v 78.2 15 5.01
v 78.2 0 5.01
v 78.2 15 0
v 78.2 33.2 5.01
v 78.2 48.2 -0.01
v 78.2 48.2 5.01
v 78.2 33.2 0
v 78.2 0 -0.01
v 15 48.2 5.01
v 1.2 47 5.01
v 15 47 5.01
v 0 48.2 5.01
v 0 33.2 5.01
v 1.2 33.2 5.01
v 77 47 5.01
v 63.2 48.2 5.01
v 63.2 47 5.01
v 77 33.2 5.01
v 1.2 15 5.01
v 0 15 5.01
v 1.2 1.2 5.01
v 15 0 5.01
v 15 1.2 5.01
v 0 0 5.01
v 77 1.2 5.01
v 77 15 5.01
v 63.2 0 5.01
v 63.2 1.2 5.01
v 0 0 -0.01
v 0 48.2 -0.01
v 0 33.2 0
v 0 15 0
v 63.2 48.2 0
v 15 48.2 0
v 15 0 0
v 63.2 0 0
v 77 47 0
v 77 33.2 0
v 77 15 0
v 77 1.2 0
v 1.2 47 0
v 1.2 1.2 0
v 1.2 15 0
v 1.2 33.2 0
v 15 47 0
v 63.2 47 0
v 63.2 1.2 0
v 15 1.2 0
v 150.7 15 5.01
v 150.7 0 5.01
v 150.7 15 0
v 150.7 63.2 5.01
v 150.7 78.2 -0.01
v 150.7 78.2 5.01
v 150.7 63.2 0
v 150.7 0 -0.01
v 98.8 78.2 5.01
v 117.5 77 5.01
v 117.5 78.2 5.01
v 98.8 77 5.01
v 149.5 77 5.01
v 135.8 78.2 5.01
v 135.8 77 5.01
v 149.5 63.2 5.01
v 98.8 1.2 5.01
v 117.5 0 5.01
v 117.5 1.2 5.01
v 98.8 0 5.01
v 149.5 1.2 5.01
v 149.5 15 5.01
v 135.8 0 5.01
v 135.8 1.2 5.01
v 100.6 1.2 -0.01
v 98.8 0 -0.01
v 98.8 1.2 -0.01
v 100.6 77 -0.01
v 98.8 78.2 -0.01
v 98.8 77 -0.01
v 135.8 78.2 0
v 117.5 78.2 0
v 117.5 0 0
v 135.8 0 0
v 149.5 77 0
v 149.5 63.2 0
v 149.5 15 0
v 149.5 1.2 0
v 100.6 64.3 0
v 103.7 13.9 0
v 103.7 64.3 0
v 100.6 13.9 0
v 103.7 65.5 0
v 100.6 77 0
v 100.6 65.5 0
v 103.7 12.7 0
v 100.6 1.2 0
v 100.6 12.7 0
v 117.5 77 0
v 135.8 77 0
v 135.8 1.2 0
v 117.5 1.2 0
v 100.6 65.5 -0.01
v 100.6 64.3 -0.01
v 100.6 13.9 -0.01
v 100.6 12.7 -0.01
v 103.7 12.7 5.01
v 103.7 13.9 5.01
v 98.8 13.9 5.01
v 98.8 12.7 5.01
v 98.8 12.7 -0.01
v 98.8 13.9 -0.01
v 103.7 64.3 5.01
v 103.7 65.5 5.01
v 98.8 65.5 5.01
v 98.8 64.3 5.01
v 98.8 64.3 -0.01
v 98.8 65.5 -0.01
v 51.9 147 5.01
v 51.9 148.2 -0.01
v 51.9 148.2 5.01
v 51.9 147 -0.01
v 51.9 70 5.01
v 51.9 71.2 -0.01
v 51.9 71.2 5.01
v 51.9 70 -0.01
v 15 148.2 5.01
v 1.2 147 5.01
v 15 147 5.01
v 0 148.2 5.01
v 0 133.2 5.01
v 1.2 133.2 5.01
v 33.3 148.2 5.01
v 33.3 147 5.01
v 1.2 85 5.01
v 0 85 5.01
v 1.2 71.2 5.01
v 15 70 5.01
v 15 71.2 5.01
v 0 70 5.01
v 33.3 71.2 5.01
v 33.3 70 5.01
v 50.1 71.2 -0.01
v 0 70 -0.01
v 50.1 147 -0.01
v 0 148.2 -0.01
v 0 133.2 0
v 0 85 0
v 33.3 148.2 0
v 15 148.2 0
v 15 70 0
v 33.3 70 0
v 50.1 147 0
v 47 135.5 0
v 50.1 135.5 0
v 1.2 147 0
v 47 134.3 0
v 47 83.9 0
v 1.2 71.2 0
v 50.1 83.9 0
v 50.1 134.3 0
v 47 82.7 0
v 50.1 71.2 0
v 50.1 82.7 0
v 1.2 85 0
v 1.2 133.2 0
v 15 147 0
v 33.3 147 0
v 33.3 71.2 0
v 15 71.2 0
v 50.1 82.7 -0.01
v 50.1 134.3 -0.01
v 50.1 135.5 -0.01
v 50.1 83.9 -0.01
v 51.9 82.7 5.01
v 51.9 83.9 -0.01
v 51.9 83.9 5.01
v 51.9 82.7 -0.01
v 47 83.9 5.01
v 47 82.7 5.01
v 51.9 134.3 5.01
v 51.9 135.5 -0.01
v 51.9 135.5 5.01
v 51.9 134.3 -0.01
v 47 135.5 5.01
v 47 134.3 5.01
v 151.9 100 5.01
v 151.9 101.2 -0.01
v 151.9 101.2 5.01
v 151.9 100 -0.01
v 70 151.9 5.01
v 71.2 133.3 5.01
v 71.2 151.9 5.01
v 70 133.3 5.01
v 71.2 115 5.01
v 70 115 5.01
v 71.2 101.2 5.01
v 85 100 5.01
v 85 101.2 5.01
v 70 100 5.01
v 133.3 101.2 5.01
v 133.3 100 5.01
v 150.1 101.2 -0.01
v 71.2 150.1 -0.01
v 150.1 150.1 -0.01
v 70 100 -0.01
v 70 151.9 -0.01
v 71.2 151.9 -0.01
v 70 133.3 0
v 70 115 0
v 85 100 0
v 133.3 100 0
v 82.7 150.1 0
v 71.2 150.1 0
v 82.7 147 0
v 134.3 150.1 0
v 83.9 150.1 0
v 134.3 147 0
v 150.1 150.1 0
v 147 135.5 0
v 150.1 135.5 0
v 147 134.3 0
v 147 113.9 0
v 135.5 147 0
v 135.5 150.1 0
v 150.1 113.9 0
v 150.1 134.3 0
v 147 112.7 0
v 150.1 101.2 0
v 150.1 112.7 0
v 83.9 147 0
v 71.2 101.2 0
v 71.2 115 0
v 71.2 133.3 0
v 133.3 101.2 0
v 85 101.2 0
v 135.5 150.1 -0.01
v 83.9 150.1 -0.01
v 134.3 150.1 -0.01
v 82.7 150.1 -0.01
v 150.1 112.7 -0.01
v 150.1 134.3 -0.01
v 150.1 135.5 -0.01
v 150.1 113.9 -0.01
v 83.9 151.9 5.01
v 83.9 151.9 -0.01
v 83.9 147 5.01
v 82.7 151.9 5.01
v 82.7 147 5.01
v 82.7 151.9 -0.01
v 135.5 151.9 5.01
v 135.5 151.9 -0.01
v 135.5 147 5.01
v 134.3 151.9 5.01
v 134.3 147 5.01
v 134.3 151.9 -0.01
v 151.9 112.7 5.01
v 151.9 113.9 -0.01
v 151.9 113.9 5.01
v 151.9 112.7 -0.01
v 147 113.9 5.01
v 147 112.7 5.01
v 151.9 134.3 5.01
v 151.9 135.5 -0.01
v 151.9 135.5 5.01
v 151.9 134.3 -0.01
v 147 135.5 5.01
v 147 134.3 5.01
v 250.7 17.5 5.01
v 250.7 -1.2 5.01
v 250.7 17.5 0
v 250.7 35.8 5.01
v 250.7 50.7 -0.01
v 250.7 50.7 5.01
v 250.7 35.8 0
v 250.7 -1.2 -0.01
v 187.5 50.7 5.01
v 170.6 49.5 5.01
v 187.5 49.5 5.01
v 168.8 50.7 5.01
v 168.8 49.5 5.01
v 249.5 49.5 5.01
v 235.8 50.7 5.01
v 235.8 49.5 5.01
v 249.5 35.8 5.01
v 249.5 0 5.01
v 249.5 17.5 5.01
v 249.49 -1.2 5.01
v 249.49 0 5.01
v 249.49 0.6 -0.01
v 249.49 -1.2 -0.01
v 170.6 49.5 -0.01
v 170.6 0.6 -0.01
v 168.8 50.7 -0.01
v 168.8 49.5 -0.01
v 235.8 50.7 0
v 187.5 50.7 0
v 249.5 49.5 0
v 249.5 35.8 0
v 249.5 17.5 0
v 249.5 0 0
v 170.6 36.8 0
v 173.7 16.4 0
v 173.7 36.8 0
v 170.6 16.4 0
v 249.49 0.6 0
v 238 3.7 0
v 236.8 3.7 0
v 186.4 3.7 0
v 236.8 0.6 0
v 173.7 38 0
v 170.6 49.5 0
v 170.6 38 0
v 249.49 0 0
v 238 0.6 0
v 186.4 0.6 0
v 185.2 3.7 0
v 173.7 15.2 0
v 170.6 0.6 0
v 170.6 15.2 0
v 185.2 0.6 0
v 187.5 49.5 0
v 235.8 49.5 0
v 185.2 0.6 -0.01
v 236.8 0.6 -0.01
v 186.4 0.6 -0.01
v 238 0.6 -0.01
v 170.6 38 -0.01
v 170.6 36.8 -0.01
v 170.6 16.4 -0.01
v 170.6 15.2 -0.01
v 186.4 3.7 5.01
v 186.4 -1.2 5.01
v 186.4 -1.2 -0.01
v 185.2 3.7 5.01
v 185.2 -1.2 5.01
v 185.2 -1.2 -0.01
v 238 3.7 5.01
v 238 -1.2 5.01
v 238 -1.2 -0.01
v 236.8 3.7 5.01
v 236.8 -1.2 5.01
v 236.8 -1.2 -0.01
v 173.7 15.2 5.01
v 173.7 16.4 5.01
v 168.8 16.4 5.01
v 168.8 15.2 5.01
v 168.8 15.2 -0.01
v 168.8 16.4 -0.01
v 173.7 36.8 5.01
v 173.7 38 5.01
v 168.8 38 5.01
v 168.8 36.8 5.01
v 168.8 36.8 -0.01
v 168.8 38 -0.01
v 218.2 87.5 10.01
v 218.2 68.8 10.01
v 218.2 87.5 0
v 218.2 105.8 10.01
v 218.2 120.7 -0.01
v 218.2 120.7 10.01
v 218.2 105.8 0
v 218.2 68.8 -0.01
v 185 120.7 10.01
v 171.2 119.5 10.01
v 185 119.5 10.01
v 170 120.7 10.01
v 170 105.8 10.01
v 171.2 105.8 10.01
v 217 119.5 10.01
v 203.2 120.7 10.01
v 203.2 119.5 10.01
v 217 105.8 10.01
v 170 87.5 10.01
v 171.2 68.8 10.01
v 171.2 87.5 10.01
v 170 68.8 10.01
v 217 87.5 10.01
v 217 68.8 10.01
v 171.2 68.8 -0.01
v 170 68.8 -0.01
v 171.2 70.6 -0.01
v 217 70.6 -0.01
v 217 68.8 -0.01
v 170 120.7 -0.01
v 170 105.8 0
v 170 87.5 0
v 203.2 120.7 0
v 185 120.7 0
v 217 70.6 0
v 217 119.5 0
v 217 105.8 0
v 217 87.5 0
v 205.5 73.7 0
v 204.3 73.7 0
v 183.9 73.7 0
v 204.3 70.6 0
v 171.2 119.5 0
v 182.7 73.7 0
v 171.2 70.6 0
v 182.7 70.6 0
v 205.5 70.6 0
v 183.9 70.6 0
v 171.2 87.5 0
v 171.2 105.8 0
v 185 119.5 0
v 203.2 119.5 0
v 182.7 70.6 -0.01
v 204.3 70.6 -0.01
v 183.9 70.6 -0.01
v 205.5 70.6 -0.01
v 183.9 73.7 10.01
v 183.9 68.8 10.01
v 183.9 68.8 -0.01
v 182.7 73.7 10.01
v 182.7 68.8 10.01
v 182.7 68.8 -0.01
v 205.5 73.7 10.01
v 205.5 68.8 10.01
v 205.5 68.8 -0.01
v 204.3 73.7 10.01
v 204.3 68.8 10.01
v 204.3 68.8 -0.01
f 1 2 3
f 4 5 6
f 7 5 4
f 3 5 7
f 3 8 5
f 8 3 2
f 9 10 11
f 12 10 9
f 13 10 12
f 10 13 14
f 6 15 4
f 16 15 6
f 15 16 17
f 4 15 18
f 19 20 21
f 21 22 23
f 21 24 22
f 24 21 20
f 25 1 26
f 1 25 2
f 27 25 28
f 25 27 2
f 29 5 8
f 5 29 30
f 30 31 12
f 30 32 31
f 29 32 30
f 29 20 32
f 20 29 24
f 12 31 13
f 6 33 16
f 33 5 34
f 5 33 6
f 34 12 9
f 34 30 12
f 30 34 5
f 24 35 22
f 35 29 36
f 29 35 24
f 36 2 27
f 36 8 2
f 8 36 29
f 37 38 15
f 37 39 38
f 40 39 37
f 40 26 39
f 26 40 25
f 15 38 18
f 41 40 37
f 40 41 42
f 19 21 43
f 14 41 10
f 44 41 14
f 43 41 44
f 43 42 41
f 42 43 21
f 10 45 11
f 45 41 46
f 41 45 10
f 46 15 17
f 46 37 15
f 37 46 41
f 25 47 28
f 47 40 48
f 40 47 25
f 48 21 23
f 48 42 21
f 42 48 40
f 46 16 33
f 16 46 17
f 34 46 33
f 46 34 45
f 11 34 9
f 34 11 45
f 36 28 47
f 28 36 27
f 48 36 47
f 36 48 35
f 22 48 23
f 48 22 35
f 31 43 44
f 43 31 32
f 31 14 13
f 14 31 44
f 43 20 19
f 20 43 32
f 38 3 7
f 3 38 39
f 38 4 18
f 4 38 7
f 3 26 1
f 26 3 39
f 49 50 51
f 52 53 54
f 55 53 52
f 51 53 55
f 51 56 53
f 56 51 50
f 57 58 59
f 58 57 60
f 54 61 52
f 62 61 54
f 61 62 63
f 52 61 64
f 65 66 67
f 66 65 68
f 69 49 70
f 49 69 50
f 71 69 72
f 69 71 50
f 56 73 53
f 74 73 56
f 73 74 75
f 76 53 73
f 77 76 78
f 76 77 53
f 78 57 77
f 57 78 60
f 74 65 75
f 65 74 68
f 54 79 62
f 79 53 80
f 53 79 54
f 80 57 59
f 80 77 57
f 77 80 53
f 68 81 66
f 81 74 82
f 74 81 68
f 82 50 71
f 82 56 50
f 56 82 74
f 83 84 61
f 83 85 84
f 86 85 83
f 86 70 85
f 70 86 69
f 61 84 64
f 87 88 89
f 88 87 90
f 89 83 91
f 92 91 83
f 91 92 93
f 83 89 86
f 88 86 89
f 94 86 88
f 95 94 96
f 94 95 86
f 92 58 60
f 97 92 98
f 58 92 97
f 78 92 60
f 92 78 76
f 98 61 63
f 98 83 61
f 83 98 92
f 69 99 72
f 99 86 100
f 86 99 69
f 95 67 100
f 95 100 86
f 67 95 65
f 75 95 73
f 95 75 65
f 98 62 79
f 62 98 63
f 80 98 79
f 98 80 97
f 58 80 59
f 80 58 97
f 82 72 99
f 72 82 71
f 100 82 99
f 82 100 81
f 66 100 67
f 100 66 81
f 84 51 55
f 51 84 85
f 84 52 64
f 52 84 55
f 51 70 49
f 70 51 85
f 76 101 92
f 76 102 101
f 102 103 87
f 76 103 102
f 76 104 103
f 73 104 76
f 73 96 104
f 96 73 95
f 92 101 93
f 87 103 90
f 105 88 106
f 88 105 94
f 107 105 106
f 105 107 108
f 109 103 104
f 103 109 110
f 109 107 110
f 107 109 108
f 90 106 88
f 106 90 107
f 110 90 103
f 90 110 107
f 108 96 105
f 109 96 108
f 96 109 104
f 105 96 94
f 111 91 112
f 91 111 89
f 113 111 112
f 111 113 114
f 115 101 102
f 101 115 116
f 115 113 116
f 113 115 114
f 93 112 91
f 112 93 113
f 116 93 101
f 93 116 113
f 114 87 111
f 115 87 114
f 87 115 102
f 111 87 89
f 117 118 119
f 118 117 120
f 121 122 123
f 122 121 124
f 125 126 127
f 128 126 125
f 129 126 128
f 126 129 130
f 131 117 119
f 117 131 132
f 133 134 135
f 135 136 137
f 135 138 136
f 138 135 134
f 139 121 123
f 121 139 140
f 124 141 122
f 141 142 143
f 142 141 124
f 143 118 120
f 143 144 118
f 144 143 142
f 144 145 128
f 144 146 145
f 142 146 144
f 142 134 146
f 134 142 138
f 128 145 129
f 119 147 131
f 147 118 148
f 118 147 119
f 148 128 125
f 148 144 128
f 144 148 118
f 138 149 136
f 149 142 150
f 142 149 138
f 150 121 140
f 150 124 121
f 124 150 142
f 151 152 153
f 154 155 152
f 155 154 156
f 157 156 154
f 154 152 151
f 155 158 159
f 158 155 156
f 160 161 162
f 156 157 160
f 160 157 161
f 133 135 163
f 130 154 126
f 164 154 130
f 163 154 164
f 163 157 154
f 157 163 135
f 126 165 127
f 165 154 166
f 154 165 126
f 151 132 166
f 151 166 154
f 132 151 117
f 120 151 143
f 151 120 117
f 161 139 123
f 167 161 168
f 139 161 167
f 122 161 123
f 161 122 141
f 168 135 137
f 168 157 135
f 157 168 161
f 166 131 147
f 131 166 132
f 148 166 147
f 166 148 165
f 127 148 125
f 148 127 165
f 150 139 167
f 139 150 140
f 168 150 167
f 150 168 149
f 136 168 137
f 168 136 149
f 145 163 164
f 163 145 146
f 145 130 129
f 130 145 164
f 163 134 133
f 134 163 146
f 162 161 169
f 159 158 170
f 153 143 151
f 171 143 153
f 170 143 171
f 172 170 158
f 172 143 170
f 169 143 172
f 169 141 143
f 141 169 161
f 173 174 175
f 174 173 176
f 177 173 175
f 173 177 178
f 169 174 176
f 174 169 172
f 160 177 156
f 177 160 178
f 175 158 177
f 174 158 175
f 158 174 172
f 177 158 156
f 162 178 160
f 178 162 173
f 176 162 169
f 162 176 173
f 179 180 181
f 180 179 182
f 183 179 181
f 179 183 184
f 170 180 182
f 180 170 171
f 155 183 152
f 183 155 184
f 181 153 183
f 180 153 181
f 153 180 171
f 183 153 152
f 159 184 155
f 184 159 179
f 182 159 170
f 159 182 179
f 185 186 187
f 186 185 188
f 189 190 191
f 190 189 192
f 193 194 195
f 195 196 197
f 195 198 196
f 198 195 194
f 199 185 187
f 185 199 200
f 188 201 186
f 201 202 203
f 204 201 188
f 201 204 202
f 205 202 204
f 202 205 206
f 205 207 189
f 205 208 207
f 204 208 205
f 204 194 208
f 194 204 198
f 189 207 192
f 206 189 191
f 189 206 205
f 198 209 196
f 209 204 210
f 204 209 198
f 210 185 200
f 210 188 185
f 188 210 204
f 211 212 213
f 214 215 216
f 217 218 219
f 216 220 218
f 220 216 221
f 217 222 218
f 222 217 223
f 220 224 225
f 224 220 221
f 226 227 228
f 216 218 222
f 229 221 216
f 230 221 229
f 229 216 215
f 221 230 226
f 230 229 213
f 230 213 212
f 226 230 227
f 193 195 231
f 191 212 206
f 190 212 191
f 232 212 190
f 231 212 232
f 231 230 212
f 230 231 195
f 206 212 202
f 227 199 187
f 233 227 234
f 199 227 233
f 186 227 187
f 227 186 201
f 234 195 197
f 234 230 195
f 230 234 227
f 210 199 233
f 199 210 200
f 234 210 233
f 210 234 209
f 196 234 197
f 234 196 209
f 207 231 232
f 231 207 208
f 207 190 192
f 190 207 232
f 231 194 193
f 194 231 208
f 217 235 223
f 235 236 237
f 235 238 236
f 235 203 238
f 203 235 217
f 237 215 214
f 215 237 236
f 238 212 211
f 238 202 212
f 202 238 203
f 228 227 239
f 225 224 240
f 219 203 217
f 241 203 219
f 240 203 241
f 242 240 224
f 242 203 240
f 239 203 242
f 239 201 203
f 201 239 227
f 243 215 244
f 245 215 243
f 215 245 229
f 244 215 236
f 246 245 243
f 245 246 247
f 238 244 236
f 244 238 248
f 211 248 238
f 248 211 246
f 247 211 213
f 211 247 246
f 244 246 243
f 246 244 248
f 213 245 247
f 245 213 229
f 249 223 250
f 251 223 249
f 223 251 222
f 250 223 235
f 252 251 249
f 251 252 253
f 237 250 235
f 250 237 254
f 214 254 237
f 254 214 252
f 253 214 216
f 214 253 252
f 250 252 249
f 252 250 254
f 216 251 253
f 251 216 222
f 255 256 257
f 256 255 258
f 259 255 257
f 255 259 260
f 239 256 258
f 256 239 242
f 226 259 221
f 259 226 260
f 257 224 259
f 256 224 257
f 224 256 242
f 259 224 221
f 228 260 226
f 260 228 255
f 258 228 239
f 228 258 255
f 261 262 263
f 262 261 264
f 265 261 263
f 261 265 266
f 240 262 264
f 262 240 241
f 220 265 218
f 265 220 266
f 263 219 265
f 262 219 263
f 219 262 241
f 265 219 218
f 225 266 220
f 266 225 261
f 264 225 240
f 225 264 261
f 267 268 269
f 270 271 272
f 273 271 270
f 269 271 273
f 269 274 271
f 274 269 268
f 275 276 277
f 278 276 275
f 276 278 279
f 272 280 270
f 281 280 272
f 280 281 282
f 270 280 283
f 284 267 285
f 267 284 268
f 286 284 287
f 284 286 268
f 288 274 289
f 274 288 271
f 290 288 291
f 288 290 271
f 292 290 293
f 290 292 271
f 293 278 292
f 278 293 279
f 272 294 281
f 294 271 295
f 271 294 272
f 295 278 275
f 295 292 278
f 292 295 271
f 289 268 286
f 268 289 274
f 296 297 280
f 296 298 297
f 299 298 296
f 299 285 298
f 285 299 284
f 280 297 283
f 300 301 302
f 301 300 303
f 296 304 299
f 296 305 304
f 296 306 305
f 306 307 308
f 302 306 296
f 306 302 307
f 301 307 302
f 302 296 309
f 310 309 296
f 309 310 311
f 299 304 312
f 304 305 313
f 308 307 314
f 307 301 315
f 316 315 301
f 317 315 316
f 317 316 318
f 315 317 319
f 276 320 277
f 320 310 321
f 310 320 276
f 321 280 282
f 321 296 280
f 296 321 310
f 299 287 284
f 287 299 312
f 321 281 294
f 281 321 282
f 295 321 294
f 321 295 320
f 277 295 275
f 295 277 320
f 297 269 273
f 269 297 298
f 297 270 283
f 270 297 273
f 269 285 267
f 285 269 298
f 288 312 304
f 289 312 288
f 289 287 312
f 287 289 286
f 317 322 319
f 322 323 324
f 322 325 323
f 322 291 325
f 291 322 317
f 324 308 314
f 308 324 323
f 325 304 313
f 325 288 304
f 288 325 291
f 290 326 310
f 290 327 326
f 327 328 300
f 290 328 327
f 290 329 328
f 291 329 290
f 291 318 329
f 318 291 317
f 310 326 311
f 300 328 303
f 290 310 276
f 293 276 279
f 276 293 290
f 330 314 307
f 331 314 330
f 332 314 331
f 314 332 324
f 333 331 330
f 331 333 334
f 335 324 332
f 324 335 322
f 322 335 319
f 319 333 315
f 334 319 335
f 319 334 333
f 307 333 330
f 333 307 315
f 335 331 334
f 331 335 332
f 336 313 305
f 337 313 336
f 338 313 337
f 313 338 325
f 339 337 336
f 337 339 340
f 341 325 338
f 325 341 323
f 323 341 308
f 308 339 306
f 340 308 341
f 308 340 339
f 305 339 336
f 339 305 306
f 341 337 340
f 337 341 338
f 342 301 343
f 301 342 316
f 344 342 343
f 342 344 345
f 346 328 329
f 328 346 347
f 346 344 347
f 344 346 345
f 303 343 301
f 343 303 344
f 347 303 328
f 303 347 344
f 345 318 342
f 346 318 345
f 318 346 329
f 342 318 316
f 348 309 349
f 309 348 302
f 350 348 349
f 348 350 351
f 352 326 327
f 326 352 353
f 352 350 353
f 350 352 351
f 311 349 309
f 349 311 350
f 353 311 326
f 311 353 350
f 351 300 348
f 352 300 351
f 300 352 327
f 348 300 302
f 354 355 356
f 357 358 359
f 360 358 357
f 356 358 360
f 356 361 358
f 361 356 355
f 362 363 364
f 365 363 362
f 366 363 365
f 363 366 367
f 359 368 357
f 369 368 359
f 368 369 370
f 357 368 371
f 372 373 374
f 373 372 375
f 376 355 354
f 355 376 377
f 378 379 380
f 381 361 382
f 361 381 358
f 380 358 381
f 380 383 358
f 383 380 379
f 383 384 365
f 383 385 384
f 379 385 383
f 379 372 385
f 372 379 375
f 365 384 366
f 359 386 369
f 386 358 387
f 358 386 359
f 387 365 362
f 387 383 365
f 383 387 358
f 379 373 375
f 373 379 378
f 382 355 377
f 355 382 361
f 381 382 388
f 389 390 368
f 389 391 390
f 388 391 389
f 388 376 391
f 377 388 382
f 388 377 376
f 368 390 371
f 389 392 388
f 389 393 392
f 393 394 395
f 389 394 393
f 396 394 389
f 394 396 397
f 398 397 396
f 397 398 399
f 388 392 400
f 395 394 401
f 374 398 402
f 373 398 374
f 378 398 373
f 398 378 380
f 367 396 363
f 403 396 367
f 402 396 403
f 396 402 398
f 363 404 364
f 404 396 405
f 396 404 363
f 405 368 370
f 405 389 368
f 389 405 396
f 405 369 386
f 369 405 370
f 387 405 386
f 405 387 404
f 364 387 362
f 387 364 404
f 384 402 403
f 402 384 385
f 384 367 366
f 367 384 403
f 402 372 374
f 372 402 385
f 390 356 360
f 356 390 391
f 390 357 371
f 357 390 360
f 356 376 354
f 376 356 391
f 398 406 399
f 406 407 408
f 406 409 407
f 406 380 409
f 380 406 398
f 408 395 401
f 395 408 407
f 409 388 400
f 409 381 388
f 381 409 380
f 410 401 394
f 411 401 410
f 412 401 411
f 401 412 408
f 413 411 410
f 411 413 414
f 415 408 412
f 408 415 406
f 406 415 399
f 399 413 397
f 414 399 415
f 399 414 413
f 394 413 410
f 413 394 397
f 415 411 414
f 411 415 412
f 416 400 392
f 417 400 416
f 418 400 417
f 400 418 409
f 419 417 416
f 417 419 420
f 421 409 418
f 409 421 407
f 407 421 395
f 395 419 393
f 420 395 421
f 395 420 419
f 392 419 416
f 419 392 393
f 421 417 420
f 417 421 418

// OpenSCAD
// file: ../../Base/Boxes.scad
// Fischertechnik Box Foundation
// Pre-designed Boxes

use <Constants.scad>

include <PlacementOptions.scad>

box190Width = 190;
box190Depth = 130;
box130Width = 130;
box130Depth = 95;
boxUsageHeight = 33.9;
boxWallThickness = 2.4;
boxBaseThickness = 1.0;

// getBoxWallThickness()
// Gets the wall thickness of a Fischertechnik Box

function getBoxWallThickness() = boxWallThickness;

// Gets the usable height of a fischertechnik box
function getBoxUsageHeight() = boxUsageHeight;

// Gets the thickness of the Fischertechnik box base.
function getBoxBaseThickness() = boxBaseThickness;

// Gets the usable inner space of a Box 190 as an x/y-list
function getBox190Space() = [
    box190Width - 2*getBoxWallThickness(), 
    box190Depth - 2*getBoxWallThickness() ];

// Imports the Fischertechnik empty box 130x190 mm and places it at position 0,0
// 190x130 are the outer sizes, the inner space is slightly smaller. Use getBox190Space() to get the inner sizes.
// This module needs the STL file "Fischertechnik Box 130x190.stl" in the library path.
// The box is positioned that the usable inner space is at the 0,0,0 position. The

module Box190() {
    translate([-getBoxWallThickness(),-getBoxWallThickness(),-getBoxBaseThickness()])
        import("Fischertechnik Box 130x190.stl", convexity=3);
}

// Gets the usable inner space of a Box 130 as an x/y-list
function getBox130Space() = [
    box130Width - 2*getBoxWallThickness(), 
    box130Depth - 2*getBoxWallThickness() ];

// Imports the Fischertechnik empty box 95x130 mm and places it at position 0,0
// 190x130 are the outer sizes, the inner space is slightly smaller. Use getBox190Space() to get the inner sizes.
// This module needs the STL file "Fischertechnik Box 95x130.stl" in the library path.
// The box is positioned that the usable inner space is at the 0,0,0 position. The

module Box130() {
    translate([-getBoxWallThickness(),-getBoxWallThickness(),-getBoxBaseThickness()])
        import("Fischertechnik Box 95x130.stl", convexity=3);
}

// Creates a web at the specified box walls
// corner 0 = LowerLeft, 1 = UpperLeft, 2 = UpperRight, 3 = LowerRight
// side 0 = LeftOfCorner, 1 = RightOfCorner
// distance = Distance in mm from the corner
// box = inner width and depth of the box (default: Box 190)
// webWidth = length of the web (default is 3 mms)
// webThickness = thickness of the web (default is 1 mm)

module BoxWeb(corner, side, distance, box=getBox190Space(), webWidth=3, webThickness=1.0) {
    sink = getBoxWallThickness()/2;

    width = (corner % 2 == 0) ? 
            (side == LeftOfCorner ? webWidth : webThickness) :
            (side == LeftOfCorner ? webThickness : webWidth);

    depth = (corner % 2 == 0) ? 
            (side == RightOfCorner ? webWidth : webThickness) :
            (side == RightOfCorner ? webThickness : webWidth);
    
    xDiff = corner == LowerLeft ? 
                (side == LeftOfCorner ? -sink : distance) :
            (corner == UpperLeft ?                
                (side == LeftOfCorner ? distance : -sink) :
            (corner == UpperRight ?
                (side == LeftOfCorner ? box.x-webWidth+sink : box.x-distance-webThickness) :
                (side == LeftOfCorner ? box.x-distance-webThickness: box.x-webWidth+sink)));

    yDiff = corner == LowerLeft ? 
                (side == RightOfCorner ? -sink : distance) :
            (corner == UpperLeft ?
                (side == RightOfCorner ? box.y-distance : box.y-webWidth+sink) :
            (corner == UpperRight ?
                (side == RightOfCorner ? box.y-webWidth+sink : box.y-distance) :
                (side == RightOfCorner ? distance : -sink)));
    
    translate([xDiff, yDiff, -getExcess()])
        cube([width, depth, boxUsageHeight + 2*getExcess()]);
}
// file: ../../Base/Rotation.scad
// Fischertechnik Box Foundation
// Geometry Helpers Rotation

include <PlacementOptions.scad>

// getRotatedSpace(space, rotation=NoRotation)
// Rotates the space dependent on the specified rotation

function getRotatedSpace(space, rotation=NoRotation) = [
    (rotation == Rotate90 || rotation == Rotate270) ? space.y : space.x,
    (rotation == Rotate90 || rotation == Rotate270) ? space.x : space.y
];

// Rotates the given space around the fixed left lower corner
// space = the space the children needs as width/depth list [width,depth]
// rotation = 0 Rotate0 degrees, 1 Rotate90 degrees, 2 Rotate180 degrees, 3 Rotate270 degrees (equivalent to -90)

module RotateFix(space, rotation=Rotate0) {
    dy = (rotation == Rotate0 || rotation == Rotate270) ? 0 :
        (rotation == Rotate90) ? space.x :
        space.y;
    dx = (rotation < Rotate180) ? 0 :
        (rotation == Rotate180) ? space.x :
        space.y;
    
    translate([dx, dy, 0])
        rotate([0, 0, rotations[rotation]])
            children();
}
// file: ../../Base/Alignment.scad
// Fischertechnik Box Foundation
// Geometry Helpers Alignment

include <PlacementOptions.scad>

// getAlignedX(elementWidth, spaceWidth, align=AlignRight, offset=0)
// Gets the aligned X offset of an element with the given
// width in the given space.
// elementWidth = The width of the element to positon
// spaceWidth = The space where the element should be aligned
// align = 0 AlignLeft, 1 AlignCenter, 2 AlignRight
// offset = an optional offset from the aligned position. When
// aligned left or centered, then positive values are in X direction.
// When aligned right then positive values are in negative X direction.

function getAlignedX(elementWidth, spaceWidth, align=AlignRight, offset=0) =
    (align == AlignLeft) ?
        offset :
        ((align == AlignCenter) ?
        (spaceWidth - elementWidth)/2 + offset :
        spaceWidth - offset - elementWidth);

// getAlignedY(elementDepth, spaceDepth, align=AlignTop, offset=0)
// Gets the aligned Y offset of an element with the given
// depth in the given space.
// elementDepth = The depth of the element to positon
// spaceDepth = The space where the element should be aligned
// align = 0 AlignBottom, 1 AlignCenter, 2 AlignTop
// offset = an optional offset from the aligned position. When
// aligned bottom or centered, then positive values are in Y direction.
// When aligned top then positive values are in negative Y direction.

function getAlignedY(elementDepth, spaceDepth, align=AlignTop, offset=0) =
    (align == AlignBottom) ?
        offset :
        ((align == AlignCenter) ?
        (spaceDepth - elementDepth)/2 + offset :
        spaceDepth - offset - elementDepth);
// file: ../../Base/Placement.scad
// Fischertechnik Box Foundation
// Geometry Helpers Placement

use <Constants.scad>
use <Alignment.scad>
use <Rotation.scad>
use <Boxes.scad>

include <PlacementOptions.scad>

// Place(x=0, y=0, elementSpace=[0,0], alignX=AlignLeft, alignY=AlignBottom, rotation=Rotate0, boxSpace=getBox190Space())
// Places the child at the specified position
// y = Y-Position. This is a relative position when an X aligment is specified.
// x = X-Position. This is a relative position when an Y aligment is specified.
// elementSpace = space of the element to be placed [x,y]
// alignX = -1=NoAlign, 0 AlignLeft, 1 AlignCenter, 3 AlignRight (elementSpace and boxSpace required!)
// alignY = -1=NoAlign, 2 AlignBottom, 1 AlignCenter, 4 AlignTop (elementSpace and boxSpace required!)
// rotation = 0 Rotate0 0 degrees, 1 Rotate90 90 degrees, 
// 2 Rotate180 180 degrees, 3 Rotate270 270 degrees (equivalent to -90)
// boxSpace = Inner space of the box where the placement occurs [x,y] - default is Box 190x130 inner space

module Place(x=0, y=0, elementSpace=[0,0], 
  alignX=AlignLeft, alignY=AlignBottom, 
  rotation=NoRotation, boxSpace=getBox190Space()) {

    module Position(x, y, space, rotation=Rotate0) {
        translate([x, y, 0])
            RotateFix(space, rotation)
                children(0);
    }

    space = getRotatedSpace(elementSpace, rotation);
    alignedX = getAlignedX(space.x, boxSpace.x, alignX, x);
    alignedY = getAlignedY(space.y, boxSpace.y, alignY, y);
    Position(alignedX, alignedY, elementSpace, rotation)
        children(0);
}

// Center(space=getBox130Space(), elementSpace=[0,0])
// space = Space where the children is centered. For cylinder use centered=true and no elementSpace.
// elementSpace = space of the element to be centered [x,y]

module Center(space=getBox190Space(), elementSpace=[0,0]) {
    translate([(space.x - elementSpace.x) / 2, (space.y - elementSpace.y) / 2])
        children(0);
}

// CenterHorizontal(width=0, y=0, offset=0, space=getBox130Space())
// space = Space where the children is centered. For cylinder use centered=true and no elementSpace.
// elementSpace = space of the element to be centered [x,y]

module CenterHorizontal(width=0, y=0, offset=0, space=getBox190Space()) {
    translate([(space.x - width) / 2 + offset, y])
        children(0);
}

// CenterVertical(depth=0, x=0, offset=0, space=getBox130Space())
// space = Space where the children is centered. For cylinder use centered=true and no elementSpace.
// elementSpace = space of the element to be centered [x,y]

module CenterVerticalal(depth=0, x=0, offset=0, space=getBox190Space()) {
    translate([x, (space.y - depth) / 2 + offset])
        children(0);
}
// file: ../../Base/PlacementOptions.scad
// Fischertechnik Box Foundation
// Placement Options

// Alignment
NoAlign = 0;
AlignLeft = 1;
AlignBottom = 2;
AlignCenter = 3;
AlignRight = 4;
AlignTop = 5;

// Element rotation degree steps
rotations = [0, -90, -180, -270];

// Rotation
NoRotation = 0;
Rotate0 = 0;
Rotate90 = 1;
Rotate180 = 2;
Rotate270 = 3;

// Docking (seen from above)
NoDock = -1;
DockLeft = 0;
DockTop = 1;
DockRight = 2;
DockCorner = 2;
DockBottom = 3;

// Web corners
LowerLeft = 0;
UpperLeft = 1;
UpperRight = 2;
LowerRight = 3;

// Web position relative to corner
LeftOfCorner = 0;
RightOfCorner = 1;
// file: ../../Base/Constants.scad
// Fischertechnik Box Foundation
// Constants

// Constant values necessary for multiple elements

// Base constants
dividerThickness = 1.2;
excess = 0.01;
fragments = 90;
tolerance = 0.8;

// Gets the thickness of a divider 
function getDividerThickness() = dividerThickness;

// Gets the excess that is used to merge walls into each other
function getExcess() = excess;

// Gets amount of fragments of a cylinder
function getFragments() = fragments;

// Gets the inner tolerance of a frame to each side
function getTolerance() = tolerance;


// Fischertechnik specific constants
axisDiameter = 4;
axisBottomDiameter = axisDiameter + 1;
standardEdgeDistance = 2.5;
standardWebDistance = 11.5;
standardCornerLength = 15;
tubeWallFactor = 1.6;

// Gets axis diameter
function getAxisDiameter() = axisDiameter;

// Gets axis bottom diameter for thicker part at the bottom
function getAxisBottomDiameter() = axisBottomDiameter;

// gets the standard distance to the wall of the box for dockable frames with webs
function getStandardEdgeDistance() = standardEdgeDistance;

// gets the standard distance of each web to the corner of the dockable frame
function getStandardWebDistance() = standardWebDistance;

// gets the standard length of the corner walls of a dockable frame
function getStandardCornerLength() = standardCornerLength;

// gets the wall thickness of a tube.
function getTubeWallThickness() = tubeWallFactor * getDividerThickness();
// main file
// Fischertechnik Box Foundation
// ModelBase
// Test DockableEdgedFrame

use <../../Base/Constants.scad>
use <../../ModelBase/Complex.scad>

include <../../Base/PlacementOptions.scad>

DockableEdgedFrame([75, 45, 5]);

translate([100, 0, 0])
    DockableEdgedFrame([45, 75, 5], alignX=AlignLeft);
    
translate([0, 70, 0])
    DockableEdgedFrame([45, 75, 5], alignX=AlignRight);

translate([70, 100, 0])
    DockableEdgedFrame([75, 45, 5], alignX=AlignRight, alignY=AlignTop);

translate([170, 0, 0])
    DockableEdgedFrame([75, 45, 5], alignX=AlignLeft, alignY=AlignBottom);
    
translate([170, 70, 0])
    DockableEdgedFrame([45, 45, 10], alignY=AlignBottom);
